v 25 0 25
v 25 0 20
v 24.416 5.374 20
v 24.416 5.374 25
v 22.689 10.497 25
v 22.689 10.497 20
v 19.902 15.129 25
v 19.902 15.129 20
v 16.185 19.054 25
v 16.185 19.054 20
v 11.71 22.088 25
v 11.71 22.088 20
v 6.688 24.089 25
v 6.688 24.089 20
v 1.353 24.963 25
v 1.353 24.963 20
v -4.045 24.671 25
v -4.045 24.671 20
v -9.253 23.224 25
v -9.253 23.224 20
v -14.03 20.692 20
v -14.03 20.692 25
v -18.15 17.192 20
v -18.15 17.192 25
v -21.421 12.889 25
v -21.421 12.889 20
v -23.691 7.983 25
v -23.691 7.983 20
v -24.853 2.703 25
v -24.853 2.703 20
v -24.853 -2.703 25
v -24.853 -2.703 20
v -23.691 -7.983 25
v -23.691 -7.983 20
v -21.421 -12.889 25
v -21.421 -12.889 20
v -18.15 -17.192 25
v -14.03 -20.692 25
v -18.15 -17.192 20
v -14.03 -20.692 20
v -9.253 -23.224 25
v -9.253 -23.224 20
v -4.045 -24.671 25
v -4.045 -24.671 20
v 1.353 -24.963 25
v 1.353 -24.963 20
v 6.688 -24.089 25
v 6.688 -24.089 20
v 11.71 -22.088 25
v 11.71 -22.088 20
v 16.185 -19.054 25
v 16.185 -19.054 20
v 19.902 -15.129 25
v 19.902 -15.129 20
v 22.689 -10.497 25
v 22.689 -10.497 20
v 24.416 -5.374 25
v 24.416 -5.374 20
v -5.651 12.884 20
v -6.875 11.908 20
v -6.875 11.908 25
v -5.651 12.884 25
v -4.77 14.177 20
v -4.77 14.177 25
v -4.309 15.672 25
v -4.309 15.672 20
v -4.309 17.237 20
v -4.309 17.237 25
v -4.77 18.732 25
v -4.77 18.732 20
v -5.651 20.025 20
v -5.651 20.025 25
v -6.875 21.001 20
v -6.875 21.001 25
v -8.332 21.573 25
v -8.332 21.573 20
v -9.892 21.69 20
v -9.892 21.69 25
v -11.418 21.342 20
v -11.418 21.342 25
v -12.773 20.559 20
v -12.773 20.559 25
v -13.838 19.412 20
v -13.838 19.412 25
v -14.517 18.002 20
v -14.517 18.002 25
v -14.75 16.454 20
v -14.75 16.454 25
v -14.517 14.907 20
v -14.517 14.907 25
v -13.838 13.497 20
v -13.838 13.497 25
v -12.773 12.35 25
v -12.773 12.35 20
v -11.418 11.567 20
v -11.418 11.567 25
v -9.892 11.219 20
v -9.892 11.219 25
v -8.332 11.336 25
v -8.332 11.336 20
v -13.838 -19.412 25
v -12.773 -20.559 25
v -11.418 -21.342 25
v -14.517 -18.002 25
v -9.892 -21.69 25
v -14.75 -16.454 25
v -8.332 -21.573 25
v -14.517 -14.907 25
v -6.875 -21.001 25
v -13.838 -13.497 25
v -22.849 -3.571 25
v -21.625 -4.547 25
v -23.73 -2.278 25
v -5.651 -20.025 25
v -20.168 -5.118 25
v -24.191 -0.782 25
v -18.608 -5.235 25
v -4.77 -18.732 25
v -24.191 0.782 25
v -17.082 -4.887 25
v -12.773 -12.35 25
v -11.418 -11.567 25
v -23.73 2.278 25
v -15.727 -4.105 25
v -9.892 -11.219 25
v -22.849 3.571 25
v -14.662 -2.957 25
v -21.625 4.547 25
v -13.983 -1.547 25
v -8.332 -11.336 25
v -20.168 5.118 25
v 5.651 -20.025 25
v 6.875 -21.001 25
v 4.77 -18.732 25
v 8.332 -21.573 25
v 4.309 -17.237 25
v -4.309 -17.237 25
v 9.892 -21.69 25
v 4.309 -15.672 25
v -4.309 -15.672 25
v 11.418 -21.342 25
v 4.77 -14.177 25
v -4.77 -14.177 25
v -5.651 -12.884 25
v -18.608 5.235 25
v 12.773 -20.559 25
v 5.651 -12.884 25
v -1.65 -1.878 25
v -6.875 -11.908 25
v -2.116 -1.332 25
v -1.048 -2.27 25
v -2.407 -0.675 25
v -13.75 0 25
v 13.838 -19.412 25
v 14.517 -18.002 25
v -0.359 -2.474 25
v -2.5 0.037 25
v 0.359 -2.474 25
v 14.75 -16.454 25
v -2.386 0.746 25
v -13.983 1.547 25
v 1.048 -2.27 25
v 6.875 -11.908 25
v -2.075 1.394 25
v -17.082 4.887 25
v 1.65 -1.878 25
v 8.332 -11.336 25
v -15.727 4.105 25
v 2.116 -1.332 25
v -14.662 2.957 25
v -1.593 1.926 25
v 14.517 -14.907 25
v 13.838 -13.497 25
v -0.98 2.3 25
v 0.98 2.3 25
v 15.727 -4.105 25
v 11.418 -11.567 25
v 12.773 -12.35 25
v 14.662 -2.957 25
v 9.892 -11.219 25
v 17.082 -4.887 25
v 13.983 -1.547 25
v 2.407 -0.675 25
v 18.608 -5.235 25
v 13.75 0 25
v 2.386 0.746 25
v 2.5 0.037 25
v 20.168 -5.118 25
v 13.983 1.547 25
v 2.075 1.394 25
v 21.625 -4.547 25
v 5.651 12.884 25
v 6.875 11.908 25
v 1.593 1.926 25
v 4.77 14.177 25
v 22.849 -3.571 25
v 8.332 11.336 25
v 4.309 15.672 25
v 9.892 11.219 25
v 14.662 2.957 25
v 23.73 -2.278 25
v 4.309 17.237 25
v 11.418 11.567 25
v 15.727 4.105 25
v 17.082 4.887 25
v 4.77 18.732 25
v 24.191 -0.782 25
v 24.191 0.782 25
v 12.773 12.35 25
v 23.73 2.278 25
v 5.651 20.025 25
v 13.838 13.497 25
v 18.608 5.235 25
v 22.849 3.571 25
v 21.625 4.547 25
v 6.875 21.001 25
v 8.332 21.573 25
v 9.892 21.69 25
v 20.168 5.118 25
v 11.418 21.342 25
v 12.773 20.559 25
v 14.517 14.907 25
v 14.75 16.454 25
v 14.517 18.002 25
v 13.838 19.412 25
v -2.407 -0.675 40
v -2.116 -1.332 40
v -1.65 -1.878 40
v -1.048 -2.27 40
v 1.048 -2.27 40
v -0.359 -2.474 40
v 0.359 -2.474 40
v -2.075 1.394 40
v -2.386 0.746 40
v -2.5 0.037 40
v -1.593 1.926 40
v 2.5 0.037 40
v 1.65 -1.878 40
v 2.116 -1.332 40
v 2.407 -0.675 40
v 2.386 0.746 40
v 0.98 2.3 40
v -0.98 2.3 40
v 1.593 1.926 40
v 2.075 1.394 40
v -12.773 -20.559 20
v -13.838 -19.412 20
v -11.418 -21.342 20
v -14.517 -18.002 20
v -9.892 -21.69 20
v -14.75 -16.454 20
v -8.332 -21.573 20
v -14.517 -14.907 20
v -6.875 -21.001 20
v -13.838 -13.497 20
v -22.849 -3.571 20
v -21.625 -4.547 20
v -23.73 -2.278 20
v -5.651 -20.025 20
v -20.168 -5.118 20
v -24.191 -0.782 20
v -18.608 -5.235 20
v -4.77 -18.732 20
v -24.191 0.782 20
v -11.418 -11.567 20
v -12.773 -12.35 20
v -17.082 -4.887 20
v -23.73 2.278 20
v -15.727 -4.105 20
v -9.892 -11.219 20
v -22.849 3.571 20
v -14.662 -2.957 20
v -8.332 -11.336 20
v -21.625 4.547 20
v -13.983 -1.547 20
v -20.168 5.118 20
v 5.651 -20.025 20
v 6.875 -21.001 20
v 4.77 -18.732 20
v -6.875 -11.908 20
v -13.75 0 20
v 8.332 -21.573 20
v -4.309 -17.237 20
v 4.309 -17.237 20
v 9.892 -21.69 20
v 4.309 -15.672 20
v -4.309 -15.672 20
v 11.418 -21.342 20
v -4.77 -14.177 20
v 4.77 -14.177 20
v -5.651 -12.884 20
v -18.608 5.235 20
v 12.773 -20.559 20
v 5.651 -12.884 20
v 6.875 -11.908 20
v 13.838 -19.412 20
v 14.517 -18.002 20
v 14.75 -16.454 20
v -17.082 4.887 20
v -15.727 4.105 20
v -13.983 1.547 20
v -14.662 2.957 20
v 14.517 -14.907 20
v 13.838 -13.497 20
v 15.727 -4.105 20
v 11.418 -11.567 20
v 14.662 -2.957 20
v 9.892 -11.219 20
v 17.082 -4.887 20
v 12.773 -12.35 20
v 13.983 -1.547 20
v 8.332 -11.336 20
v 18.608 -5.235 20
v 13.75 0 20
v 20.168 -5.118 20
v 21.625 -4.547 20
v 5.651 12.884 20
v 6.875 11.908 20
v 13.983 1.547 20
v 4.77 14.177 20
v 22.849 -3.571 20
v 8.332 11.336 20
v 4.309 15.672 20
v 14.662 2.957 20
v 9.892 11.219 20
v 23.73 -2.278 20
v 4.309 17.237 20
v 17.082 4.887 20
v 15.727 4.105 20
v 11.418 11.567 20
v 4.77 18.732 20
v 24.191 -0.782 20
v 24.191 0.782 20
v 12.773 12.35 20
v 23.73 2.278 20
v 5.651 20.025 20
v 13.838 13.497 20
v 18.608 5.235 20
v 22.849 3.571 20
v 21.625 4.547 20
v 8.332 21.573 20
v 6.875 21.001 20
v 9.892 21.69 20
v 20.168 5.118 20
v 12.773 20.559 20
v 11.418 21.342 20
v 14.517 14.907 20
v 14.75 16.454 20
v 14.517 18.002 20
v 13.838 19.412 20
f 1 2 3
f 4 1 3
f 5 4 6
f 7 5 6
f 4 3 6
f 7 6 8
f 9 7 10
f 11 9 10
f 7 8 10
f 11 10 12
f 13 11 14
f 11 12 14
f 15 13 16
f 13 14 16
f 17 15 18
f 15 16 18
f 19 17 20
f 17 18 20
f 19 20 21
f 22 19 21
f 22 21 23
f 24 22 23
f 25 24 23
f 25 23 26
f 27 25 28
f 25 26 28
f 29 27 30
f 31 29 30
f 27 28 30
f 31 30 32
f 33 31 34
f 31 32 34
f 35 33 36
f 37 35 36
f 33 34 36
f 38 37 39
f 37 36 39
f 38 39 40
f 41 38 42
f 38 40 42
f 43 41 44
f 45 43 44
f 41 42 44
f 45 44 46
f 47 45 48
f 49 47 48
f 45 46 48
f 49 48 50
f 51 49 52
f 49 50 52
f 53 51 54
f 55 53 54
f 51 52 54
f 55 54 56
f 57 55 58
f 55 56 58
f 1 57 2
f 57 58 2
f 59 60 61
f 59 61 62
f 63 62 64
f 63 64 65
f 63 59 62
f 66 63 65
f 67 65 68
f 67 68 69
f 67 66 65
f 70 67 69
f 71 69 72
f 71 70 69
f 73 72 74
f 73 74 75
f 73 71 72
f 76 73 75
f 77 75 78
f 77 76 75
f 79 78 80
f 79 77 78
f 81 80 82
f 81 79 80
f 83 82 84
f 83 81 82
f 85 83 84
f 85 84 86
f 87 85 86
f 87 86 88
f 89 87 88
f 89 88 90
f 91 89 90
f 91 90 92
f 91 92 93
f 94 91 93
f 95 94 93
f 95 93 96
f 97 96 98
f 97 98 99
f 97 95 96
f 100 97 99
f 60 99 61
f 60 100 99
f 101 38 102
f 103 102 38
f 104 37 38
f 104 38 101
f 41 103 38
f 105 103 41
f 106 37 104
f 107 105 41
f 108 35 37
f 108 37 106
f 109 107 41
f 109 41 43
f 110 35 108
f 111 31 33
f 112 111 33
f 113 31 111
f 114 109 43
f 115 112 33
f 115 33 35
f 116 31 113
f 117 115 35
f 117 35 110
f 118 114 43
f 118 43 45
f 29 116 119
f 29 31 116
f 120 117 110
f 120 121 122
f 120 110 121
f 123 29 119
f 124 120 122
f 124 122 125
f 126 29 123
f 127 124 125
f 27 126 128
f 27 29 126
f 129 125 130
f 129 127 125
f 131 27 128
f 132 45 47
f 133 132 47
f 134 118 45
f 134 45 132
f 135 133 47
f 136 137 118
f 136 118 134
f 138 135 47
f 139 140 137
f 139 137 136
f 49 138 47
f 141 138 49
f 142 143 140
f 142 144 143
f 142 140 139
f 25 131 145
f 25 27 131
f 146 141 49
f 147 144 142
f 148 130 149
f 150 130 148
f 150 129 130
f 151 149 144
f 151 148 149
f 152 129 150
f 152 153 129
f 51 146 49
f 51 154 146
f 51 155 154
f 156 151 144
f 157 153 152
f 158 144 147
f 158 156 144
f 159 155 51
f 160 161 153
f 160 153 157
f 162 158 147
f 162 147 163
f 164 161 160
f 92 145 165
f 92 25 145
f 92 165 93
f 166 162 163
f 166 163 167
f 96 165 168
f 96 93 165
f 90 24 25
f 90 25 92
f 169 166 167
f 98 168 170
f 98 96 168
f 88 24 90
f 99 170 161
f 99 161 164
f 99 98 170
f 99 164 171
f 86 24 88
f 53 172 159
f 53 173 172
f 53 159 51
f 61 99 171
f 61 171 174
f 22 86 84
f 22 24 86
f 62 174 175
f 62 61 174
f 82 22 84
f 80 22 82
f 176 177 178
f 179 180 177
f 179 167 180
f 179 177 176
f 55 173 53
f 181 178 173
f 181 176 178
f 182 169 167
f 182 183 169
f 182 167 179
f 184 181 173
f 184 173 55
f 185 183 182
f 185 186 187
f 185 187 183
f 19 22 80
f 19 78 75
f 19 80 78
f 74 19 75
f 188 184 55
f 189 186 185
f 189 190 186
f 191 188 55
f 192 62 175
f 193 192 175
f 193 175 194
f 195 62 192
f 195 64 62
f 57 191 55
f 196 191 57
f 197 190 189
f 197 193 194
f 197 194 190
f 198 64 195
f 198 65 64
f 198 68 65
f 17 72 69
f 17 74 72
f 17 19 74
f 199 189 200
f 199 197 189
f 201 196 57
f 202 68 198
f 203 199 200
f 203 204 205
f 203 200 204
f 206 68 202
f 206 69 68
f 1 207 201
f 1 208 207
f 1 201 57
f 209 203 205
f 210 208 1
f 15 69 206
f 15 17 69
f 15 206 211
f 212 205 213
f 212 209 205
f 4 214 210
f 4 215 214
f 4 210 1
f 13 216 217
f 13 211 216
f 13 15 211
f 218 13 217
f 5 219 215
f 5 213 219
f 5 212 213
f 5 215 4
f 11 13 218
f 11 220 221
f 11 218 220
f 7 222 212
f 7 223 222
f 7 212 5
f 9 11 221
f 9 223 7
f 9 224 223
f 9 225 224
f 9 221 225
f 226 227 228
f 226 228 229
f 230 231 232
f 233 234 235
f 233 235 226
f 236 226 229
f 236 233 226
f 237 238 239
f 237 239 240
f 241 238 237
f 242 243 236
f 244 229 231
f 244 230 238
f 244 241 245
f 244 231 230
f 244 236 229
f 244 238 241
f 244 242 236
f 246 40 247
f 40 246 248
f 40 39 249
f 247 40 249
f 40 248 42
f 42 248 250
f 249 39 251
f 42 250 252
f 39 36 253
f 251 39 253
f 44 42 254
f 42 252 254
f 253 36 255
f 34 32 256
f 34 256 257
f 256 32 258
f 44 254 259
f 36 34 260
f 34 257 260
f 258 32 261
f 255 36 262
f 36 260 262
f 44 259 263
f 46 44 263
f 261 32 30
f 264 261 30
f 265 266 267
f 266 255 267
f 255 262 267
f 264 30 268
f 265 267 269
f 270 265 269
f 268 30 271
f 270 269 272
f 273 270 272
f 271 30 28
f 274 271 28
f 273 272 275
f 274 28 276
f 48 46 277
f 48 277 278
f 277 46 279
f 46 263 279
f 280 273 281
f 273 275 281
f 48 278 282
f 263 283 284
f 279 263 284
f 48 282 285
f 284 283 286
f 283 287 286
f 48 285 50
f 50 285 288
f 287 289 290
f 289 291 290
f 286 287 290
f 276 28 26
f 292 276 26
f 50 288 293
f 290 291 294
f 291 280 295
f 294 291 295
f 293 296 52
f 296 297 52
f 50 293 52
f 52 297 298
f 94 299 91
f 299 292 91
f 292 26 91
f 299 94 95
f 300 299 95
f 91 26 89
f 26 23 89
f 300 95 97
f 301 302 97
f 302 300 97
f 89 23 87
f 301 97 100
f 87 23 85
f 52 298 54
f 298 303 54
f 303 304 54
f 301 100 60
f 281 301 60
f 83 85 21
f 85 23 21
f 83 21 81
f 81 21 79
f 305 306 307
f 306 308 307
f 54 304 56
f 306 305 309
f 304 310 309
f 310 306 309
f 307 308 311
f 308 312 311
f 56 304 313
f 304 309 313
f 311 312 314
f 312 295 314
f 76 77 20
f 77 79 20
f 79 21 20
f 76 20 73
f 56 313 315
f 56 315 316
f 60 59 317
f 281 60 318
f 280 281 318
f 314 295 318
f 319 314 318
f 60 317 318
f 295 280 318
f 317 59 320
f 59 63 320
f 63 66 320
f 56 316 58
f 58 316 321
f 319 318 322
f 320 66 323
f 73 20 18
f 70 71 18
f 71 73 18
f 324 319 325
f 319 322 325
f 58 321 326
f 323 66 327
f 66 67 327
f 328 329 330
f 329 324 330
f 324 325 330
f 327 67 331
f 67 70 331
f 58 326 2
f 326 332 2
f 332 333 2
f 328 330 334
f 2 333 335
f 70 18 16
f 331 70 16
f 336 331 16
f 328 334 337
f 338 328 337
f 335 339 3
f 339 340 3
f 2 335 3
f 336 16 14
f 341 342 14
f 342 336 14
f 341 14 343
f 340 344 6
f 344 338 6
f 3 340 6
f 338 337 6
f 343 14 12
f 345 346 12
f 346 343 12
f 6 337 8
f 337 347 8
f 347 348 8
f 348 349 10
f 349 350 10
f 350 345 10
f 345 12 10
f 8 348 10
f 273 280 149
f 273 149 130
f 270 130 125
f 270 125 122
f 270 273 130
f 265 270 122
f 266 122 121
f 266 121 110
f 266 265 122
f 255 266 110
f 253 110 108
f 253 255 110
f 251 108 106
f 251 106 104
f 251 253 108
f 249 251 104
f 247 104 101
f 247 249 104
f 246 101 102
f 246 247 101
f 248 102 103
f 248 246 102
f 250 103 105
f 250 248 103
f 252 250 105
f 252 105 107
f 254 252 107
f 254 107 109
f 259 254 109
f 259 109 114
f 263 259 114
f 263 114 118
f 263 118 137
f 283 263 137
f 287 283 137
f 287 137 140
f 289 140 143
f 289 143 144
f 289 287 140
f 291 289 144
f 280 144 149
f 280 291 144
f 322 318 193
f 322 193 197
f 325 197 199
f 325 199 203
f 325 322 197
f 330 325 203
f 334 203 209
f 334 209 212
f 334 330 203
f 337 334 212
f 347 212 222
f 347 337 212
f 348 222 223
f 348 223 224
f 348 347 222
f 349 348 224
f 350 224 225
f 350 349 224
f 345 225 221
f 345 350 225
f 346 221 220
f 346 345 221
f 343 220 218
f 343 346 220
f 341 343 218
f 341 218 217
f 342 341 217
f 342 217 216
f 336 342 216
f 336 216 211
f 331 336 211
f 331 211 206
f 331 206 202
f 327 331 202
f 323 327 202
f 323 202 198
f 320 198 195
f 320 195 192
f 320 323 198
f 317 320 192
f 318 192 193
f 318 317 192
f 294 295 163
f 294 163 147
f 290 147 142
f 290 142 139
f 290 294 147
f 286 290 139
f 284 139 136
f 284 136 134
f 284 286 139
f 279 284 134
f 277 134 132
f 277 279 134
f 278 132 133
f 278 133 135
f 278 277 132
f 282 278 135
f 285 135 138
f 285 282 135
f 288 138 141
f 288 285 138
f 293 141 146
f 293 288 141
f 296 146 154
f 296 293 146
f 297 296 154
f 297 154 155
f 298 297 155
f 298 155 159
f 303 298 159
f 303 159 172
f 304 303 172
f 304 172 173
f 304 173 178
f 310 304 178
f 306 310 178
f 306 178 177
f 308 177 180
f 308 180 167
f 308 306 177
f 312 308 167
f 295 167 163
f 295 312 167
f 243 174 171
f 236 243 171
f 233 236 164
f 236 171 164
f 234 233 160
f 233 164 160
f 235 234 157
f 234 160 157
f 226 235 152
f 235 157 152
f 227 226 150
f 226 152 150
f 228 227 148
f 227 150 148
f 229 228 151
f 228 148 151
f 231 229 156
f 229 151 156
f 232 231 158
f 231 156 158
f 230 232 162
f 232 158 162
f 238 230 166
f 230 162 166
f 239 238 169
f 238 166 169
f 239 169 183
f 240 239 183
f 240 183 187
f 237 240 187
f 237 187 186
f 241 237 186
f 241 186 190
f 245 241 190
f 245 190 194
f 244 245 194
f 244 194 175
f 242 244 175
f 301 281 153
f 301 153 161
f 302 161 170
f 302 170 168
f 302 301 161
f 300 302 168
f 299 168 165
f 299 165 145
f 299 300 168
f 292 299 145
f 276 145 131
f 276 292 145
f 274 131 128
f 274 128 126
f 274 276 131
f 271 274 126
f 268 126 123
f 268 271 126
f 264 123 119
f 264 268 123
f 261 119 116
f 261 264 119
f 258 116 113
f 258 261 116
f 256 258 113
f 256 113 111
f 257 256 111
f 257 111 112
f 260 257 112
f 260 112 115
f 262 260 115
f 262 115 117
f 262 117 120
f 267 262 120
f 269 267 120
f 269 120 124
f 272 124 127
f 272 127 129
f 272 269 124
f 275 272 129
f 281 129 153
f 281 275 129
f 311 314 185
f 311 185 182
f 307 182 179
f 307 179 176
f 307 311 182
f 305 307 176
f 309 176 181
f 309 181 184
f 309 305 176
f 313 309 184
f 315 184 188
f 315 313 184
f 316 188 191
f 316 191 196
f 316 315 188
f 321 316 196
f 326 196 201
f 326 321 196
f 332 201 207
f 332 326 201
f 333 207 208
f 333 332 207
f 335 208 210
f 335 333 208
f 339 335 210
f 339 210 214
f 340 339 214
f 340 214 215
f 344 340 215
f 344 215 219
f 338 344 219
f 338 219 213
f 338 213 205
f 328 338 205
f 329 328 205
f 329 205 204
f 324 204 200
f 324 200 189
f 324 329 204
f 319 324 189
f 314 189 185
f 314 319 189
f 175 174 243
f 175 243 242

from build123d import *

# Parameters (mm, degrees)
OUTPUTSHAFTBASESKETCH_R = 25
PAD005_DEPTH            = 5
HOLESSKETCH_R           = 5.25
POCKET_DEPTH            = 5
PAD006_DEPTH            = 20
DRIVERHOLEPOLAR_COUNT   = 6


with BuildPart() as part:
    # OutputShaftBaseSketch → Pad005 (new body)
    with BuildSketch(Plane.XY):
        Circle(OUTPUTSHAFTBASESKETCH_R)
    extrude(amount=PAD005_DEPTH)

    # holesSketch → Pocket (cut)
    with BuildSketch(Plane.XY):
        with Locations((-19, 0)):
            Circle(HOLESSKETCH_R)
    pocket = extrude(amount=POCKET_DEPTH, mode=Mode.SUBTRACT)

    # InputKeySketch001 → Pad006 (join)
    with BuildSketch(Plane.XY):
        with BuildLine():
            ThreePointArc((-0.979796, 2.3), (0, -2.5), (0.979796, 2.3))
            Line((-0.979796, 2.3), (0.979796, 2.3))
        make_face()
    extrude(amount=PAD006_DEPTH)

    # DriverHolePolar: Pocket ×6 about axis
    driverholepolar_axis = Axis((0, 0, 0), (0, 0, 1))
    for i in range(1, DRIVERHOLEPOLAR_COUNT):
        add(pocket.rotate(driverholepolar_axis, i * 360 / DRIVERHOLEPOLAR_COUNT), mode=Mode.SUBTRACT)


with BuildPart() as part_1:
    # outputShaft placement: moved
    add(part.part.moved(Location((0, 0, 20))))


solid = part_1.part
